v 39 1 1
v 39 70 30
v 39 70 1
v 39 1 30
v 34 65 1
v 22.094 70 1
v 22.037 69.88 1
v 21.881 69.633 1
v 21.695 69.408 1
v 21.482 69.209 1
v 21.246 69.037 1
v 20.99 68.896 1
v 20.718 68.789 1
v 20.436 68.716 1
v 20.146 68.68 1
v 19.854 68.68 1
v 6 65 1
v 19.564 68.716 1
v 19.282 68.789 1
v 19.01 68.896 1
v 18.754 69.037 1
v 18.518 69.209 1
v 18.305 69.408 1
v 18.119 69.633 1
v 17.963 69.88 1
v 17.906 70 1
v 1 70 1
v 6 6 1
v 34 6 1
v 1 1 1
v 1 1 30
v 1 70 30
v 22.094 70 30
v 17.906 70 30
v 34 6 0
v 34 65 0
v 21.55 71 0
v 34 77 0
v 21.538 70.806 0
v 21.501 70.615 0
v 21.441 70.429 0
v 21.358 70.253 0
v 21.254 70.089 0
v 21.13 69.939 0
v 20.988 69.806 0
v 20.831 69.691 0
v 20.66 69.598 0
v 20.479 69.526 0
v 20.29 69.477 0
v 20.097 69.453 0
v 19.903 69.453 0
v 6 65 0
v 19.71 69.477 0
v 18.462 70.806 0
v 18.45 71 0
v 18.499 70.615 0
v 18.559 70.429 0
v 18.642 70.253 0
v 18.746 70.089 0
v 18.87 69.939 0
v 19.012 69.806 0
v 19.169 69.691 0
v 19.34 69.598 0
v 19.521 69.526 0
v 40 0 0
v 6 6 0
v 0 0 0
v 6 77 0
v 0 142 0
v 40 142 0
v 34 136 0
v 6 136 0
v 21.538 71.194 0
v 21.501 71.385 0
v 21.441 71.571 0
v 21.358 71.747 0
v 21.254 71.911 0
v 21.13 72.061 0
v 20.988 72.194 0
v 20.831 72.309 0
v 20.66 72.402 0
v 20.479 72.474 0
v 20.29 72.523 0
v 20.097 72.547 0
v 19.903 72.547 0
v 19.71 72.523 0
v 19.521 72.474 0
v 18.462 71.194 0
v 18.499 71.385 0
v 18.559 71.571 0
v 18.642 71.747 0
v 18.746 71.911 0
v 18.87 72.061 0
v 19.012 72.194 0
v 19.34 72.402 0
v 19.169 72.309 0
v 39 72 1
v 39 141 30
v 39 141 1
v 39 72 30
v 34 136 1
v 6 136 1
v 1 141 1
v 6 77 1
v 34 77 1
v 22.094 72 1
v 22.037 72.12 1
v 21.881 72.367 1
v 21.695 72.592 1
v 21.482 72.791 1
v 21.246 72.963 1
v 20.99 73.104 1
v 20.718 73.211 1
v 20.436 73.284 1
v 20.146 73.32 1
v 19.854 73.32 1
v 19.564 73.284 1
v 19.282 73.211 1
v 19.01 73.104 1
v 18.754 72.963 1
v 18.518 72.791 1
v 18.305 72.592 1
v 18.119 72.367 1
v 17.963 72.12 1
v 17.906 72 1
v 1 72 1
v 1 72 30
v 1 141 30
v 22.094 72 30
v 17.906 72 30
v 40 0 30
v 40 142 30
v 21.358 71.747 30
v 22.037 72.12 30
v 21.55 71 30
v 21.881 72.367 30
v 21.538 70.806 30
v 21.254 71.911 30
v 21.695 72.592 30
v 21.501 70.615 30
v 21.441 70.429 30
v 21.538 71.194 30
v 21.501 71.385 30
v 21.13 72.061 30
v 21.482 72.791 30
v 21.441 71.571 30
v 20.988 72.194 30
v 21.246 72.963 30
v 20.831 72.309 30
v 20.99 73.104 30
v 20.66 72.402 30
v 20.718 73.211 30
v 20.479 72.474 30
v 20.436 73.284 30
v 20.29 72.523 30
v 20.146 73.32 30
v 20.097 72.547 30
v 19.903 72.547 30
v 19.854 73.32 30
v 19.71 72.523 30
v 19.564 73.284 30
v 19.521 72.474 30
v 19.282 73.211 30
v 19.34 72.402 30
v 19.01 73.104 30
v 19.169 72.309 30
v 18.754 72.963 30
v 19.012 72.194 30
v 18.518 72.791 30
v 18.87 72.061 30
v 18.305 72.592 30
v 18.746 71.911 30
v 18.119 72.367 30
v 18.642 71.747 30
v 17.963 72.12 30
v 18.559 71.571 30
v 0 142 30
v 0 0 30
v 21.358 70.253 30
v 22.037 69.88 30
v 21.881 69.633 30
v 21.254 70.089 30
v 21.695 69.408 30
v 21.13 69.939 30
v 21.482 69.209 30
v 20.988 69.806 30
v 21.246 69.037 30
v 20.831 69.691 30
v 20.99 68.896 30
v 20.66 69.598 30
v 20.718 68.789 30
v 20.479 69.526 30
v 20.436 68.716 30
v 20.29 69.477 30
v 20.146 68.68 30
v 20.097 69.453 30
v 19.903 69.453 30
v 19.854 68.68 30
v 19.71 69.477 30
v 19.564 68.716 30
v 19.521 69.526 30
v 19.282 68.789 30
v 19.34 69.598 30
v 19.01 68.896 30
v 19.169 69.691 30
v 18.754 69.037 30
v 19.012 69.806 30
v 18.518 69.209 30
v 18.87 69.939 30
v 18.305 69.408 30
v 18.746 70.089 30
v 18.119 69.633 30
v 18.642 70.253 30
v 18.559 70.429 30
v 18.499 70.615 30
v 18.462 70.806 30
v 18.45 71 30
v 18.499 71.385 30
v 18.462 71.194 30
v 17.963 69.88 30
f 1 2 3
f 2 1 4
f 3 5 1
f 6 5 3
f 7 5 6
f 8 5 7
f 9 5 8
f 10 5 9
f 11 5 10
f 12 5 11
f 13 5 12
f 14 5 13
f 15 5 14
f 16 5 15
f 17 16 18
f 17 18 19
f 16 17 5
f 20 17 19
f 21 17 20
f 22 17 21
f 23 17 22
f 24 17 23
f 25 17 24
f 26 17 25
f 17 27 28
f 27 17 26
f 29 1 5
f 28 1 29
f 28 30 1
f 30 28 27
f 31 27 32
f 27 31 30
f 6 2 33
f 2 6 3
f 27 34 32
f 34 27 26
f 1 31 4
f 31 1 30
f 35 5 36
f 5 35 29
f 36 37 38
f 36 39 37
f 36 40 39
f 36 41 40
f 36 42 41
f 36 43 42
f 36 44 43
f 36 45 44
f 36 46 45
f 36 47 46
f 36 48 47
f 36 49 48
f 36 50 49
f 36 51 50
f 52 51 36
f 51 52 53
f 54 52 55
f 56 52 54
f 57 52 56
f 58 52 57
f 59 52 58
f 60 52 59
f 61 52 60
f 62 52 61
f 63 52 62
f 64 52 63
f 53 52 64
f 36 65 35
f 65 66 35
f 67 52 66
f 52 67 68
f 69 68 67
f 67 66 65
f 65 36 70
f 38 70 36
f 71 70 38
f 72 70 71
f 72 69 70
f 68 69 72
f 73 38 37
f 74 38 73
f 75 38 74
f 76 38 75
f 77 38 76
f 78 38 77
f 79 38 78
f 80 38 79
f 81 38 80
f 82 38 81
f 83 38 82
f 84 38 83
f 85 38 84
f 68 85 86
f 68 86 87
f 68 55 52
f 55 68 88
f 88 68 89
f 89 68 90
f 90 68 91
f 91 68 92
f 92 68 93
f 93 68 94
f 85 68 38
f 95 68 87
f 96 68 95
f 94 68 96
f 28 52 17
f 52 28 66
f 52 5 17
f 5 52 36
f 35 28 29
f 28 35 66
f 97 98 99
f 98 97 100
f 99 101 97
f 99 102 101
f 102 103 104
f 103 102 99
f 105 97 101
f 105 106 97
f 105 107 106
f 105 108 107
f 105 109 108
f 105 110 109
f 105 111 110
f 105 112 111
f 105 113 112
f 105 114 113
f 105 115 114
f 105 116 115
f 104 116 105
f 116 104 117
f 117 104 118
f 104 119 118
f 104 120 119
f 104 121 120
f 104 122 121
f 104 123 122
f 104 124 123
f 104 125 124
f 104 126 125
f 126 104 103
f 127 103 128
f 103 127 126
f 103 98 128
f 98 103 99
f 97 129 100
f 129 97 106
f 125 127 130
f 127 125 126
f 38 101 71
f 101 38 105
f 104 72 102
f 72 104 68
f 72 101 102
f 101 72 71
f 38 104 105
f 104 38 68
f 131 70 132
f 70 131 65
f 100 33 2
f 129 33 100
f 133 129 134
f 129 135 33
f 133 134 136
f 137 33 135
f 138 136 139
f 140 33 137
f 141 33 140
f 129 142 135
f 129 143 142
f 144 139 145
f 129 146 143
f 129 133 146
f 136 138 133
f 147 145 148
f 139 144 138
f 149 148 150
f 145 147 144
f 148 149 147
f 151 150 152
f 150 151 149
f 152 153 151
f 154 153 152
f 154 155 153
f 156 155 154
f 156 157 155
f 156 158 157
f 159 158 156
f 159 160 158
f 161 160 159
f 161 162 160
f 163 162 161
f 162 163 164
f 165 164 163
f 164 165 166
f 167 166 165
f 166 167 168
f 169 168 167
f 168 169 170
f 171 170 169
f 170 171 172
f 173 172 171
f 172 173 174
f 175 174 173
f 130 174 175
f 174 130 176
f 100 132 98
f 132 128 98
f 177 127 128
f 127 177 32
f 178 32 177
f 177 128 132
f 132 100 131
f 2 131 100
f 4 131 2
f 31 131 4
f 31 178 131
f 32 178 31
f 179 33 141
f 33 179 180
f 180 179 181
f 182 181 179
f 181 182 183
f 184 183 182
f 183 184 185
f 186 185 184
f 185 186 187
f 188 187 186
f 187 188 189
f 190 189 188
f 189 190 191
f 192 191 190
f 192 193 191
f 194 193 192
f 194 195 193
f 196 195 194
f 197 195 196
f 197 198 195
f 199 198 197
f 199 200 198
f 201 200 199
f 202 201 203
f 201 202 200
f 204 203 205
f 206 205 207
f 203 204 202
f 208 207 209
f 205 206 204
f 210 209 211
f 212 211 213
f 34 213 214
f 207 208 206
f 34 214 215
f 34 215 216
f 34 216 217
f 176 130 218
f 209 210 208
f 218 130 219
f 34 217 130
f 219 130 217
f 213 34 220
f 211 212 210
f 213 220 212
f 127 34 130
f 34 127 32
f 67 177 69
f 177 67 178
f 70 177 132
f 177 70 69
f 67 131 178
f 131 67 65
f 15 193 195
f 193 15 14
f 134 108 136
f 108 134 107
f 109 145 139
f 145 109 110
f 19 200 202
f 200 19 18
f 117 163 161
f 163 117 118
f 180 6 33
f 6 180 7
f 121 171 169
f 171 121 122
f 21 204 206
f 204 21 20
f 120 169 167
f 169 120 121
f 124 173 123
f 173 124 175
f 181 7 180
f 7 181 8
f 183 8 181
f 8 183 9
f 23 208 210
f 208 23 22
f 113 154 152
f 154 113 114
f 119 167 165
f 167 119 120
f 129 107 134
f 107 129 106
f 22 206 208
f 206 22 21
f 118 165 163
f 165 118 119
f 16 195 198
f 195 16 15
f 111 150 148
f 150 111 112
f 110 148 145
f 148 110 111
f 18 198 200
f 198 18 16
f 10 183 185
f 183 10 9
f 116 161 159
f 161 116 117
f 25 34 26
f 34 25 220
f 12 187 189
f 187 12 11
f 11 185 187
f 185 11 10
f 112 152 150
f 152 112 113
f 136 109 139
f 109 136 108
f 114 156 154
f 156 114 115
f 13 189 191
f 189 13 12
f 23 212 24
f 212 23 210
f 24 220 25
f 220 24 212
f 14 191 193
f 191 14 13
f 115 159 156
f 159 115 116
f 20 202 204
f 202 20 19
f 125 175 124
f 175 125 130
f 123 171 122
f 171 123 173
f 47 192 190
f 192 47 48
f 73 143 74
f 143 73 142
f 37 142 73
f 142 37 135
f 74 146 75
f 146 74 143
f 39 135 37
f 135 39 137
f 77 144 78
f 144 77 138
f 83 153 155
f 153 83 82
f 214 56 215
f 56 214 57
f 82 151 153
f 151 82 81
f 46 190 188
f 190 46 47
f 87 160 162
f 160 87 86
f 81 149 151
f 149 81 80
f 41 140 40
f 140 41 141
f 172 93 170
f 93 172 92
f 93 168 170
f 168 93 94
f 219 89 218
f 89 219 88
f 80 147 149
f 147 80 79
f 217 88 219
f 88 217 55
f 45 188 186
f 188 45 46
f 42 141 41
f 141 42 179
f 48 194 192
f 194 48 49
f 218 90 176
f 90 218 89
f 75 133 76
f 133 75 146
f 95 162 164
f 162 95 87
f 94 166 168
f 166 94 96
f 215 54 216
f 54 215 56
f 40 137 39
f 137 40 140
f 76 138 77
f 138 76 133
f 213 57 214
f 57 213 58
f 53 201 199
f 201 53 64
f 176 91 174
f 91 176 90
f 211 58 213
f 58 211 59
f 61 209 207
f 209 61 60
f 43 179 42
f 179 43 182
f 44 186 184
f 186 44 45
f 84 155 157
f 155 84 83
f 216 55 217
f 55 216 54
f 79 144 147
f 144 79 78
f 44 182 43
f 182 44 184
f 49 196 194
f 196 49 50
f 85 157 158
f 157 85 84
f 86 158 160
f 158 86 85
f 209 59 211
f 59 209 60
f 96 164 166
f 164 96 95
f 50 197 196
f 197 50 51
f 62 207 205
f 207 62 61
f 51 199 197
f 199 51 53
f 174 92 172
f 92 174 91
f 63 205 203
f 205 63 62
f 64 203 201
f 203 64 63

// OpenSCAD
// make a box for a 50mm ammo can

$fn=50;
//ammo can inside dimensions.  long side is x axis.
can_x = 281;
can_y = 144;
can_z = 173;
can_gap = 1;    // leave this gap between the box and can walls

wall=1;         // thickness of wall being printed
floor = wall;   // thickness of floor being printed

// internal maximum box
box_max_x = can_x - 2 * can_gap;
box_max_y = can_y - 2 * can_gap;
box_max_z = can_z;

INCH=25.4;
//THREAD=1/4*INCH-.2;
THREAD=3.1;           // #6-32


module column(xoffset,ny, batx, baty, batz, cubey) {
    border=5;
    for (c=[0:ny/2-1]) {
        translate([xoffset,wall+c*baty+c,wall]) {
            cube([batx,baty,batz]);
            translate([border,border,-wall])
                cube([batx-2*border,baty-2*border,batz]);
        }
        translate([xoffset,cubey-wall-baty*(c+1)-c,wall]) {
            cube([batx,baty,batz]);
            translate([border,border,-wall])
                cube([batx-2*border,baty-2*border,batz]);
        }
    }
    if (ny%2 == 1) {
        translate([xoffset,wall+cubey/2-baty/2,wall]) {
            cube([batx,baty,batz]);
            translate([border,border,-wall])
                cube([batx-2*border,baty-2*border,batz]);
        }
    }
}

module b0(t,nx, ny, batx, baty, cubex=-1, cubey=box_max_y, cubez=30) {
    cubex = (cubex==-1) ? wall+nx*(wall+batx) : cubex;
    difference() {
        union() {
            b1(nx, ny, batx, baty, cubex, cubey, cubez);
            translate([cubex/2,cubey/2,0]) cylinder(h=cubez,d=THREAD*1.5);
        }
        translate([cubex/2,cubey/2,0])cylinder(h=cubez,d=THREAD);
    }

}

module b1(nx, ny, batx, baty, cubex=-1, cubey=box_max_y, cubez=30) {
    difference() {
        cube([cubex,cubey,cubez]);
        for (r=[0:nx-1]) {
            xoffset=wall+r*batx+r;
            column(xoffset,ny,batx, baty, cubez, cubey);
        }
    }
}

//b0("3s500",2,7,32.5,17.5);
//b0("4s1800",1,4,36,34);
b0("4s1800x2",1,2,38,69);
